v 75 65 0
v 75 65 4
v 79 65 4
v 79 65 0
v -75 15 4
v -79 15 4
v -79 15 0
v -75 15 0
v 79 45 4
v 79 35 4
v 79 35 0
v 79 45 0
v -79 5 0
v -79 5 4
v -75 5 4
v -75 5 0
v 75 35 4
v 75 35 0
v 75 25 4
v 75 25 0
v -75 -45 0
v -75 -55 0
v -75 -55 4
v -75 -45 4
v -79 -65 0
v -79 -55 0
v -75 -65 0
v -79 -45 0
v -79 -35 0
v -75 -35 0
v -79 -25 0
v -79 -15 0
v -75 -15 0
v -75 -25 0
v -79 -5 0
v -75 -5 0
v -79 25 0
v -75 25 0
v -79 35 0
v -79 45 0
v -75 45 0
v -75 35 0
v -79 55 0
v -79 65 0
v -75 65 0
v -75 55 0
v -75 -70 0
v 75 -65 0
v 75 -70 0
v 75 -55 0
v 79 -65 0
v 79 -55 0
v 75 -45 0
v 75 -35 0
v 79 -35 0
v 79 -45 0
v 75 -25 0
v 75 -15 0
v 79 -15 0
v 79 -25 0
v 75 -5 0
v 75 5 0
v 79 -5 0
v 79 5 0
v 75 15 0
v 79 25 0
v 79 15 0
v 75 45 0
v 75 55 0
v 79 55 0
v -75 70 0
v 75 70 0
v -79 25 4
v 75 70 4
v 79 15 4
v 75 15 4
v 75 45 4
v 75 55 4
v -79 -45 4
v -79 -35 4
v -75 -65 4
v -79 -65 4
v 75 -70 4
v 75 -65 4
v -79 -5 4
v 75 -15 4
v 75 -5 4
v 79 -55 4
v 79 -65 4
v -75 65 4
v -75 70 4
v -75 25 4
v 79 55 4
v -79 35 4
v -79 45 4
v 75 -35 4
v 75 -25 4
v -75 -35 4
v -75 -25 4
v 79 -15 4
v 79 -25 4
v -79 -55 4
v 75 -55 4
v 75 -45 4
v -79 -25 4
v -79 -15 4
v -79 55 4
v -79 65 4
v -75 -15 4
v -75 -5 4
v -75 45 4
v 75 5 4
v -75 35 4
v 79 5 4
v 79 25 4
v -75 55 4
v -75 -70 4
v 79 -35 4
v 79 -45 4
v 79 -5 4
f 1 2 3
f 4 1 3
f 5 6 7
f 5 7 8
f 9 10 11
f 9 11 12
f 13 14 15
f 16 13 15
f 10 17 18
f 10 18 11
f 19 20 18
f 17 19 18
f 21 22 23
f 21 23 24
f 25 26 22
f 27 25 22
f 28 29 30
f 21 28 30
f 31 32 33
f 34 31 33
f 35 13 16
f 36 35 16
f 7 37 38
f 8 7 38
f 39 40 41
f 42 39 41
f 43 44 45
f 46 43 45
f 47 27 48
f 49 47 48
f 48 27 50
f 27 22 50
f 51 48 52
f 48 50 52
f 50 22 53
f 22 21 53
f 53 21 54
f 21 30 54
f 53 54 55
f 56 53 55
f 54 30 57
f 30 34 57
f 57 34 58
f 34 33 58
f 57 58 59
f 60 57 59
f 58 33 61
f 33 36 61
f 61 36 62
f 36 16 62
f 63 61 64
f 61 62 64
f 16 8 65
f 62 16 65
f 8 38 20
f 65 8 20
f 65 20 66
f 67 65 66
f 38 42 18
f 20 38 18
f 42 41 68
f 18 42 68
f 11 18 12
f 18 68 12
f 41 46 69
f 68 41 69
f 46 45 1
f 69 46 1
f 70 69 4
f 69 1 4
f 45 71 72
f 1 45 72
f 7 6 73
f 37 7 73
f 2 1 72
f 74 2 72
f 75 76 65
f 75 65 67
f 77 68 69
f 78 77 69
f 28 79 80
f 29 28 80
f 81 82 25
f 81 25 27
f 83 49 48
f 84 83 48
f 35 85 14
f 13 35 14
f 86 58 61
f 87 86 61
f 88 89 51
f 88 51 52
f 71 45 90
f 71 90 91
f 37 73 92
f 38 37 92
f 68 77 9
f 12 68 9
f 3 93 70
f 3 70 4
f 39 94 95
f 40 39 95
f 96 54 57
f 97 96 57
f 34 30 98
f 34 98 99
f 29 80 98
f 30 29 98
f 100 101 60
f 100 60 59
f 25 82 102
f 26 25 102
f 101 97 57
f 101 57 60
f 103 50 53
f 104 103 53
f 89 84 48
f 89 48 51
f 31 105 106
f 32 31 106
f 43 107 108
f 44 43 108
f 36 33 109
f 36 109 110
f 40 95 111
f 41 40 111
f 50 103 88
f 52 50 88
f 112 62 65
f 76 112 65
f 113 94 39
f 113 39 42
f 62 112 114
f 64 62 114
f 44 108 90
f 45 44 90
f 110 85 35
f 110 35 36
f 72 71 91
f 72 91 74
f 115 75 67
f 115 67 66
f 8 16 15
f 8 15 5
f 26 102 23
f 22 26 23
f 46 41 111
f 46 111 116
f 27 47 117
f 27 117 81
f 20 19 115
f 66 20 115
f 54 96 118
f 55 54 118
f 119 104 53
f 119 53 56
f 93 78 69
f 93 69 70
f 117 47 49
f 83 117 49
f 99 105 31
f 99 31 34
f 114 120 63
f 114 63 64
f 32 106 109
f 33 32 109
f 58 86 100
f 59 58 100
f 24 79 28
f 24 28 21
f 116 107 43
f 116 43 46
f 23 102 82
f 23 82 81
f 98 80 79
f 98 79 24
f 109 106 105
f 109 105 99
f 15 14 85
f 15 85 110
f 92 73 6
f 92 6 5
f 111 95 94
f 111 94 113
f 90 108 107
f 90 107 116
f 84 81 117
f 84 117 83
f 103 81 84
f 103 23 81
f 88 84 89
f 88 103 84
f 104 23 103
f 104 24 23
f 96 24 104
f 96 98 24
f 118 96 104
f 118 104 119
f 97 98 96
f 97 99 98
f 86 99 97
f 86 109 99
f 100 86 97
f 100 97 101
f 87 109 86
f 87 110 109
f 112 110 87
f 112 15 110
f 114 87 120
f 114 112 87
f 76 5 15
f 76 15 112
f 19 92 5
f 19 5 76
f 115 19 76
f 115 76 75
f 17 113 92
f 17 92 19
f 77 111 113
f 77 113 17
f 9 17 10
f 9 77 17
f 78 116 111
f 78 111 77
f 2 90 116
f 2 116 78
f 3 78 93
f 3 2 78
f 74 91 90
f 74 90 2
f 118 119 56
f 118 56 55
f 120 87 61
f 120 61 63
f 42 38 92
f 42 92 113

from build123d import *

# Parameters (mm, degrees)
F0_W     = 150
F0_H     = 140
F1_DEPTH = 4
F2_W     = 4
F2_H     = 10
F3_DEPTH = 4


with BuildPart() as f1:
    # F0 (on Top) → F1 (new body)
    with BuildSketch(Plane.XY):
        Rectangle(F0_W, F0_H)
    extrude(amount=F1_DEPTH)

    # F2 (on face) → F3 (join)
    with BuildSketch(Plane.XY.offset(4)):
        with Locations((-77, -60)):
            Rectangle(F2_W, F2_H)
        with Locations((-77, -40)):
            Rectangle(F2_W, F2_H)
        with Locations((-77, -20)):
            Rectangle(F2_W, F2_H)
        with Locations((-77, 0)):
            Rectangle(F2_W, F2_H)
        with Locations((-77, 20)):
            Rectangle(F2_W, F2_H)
        with Locations((-77, 40)):
            Rectangle(F2_W, F2_H)
        with Locations((-77, 60)):
            Rectangle(F2_W, F2_H)
        with Locations((77, 0)):
            Rectangle(F2_W, F2_H)
        with Locations((77, 60)):
            Rectangle(F2_W, F2_H)
        with Locations((77, 20)):
            Rectangle(F2_W, F2_H)
        with Locations((77, -40)):
            Rectangle(F2_W, F2_H)
        with Locations((77, -60)):
            Rectangle(F2_W, F2_H)
        with Locations((77, -20)):
            Rectangle(F2_W, F2_H)
        with Locations((77, 40)):
            Rectangle(F2_W, F2_H)
    extrude(amount=-F3_DEPTH)


solid = f1.part
